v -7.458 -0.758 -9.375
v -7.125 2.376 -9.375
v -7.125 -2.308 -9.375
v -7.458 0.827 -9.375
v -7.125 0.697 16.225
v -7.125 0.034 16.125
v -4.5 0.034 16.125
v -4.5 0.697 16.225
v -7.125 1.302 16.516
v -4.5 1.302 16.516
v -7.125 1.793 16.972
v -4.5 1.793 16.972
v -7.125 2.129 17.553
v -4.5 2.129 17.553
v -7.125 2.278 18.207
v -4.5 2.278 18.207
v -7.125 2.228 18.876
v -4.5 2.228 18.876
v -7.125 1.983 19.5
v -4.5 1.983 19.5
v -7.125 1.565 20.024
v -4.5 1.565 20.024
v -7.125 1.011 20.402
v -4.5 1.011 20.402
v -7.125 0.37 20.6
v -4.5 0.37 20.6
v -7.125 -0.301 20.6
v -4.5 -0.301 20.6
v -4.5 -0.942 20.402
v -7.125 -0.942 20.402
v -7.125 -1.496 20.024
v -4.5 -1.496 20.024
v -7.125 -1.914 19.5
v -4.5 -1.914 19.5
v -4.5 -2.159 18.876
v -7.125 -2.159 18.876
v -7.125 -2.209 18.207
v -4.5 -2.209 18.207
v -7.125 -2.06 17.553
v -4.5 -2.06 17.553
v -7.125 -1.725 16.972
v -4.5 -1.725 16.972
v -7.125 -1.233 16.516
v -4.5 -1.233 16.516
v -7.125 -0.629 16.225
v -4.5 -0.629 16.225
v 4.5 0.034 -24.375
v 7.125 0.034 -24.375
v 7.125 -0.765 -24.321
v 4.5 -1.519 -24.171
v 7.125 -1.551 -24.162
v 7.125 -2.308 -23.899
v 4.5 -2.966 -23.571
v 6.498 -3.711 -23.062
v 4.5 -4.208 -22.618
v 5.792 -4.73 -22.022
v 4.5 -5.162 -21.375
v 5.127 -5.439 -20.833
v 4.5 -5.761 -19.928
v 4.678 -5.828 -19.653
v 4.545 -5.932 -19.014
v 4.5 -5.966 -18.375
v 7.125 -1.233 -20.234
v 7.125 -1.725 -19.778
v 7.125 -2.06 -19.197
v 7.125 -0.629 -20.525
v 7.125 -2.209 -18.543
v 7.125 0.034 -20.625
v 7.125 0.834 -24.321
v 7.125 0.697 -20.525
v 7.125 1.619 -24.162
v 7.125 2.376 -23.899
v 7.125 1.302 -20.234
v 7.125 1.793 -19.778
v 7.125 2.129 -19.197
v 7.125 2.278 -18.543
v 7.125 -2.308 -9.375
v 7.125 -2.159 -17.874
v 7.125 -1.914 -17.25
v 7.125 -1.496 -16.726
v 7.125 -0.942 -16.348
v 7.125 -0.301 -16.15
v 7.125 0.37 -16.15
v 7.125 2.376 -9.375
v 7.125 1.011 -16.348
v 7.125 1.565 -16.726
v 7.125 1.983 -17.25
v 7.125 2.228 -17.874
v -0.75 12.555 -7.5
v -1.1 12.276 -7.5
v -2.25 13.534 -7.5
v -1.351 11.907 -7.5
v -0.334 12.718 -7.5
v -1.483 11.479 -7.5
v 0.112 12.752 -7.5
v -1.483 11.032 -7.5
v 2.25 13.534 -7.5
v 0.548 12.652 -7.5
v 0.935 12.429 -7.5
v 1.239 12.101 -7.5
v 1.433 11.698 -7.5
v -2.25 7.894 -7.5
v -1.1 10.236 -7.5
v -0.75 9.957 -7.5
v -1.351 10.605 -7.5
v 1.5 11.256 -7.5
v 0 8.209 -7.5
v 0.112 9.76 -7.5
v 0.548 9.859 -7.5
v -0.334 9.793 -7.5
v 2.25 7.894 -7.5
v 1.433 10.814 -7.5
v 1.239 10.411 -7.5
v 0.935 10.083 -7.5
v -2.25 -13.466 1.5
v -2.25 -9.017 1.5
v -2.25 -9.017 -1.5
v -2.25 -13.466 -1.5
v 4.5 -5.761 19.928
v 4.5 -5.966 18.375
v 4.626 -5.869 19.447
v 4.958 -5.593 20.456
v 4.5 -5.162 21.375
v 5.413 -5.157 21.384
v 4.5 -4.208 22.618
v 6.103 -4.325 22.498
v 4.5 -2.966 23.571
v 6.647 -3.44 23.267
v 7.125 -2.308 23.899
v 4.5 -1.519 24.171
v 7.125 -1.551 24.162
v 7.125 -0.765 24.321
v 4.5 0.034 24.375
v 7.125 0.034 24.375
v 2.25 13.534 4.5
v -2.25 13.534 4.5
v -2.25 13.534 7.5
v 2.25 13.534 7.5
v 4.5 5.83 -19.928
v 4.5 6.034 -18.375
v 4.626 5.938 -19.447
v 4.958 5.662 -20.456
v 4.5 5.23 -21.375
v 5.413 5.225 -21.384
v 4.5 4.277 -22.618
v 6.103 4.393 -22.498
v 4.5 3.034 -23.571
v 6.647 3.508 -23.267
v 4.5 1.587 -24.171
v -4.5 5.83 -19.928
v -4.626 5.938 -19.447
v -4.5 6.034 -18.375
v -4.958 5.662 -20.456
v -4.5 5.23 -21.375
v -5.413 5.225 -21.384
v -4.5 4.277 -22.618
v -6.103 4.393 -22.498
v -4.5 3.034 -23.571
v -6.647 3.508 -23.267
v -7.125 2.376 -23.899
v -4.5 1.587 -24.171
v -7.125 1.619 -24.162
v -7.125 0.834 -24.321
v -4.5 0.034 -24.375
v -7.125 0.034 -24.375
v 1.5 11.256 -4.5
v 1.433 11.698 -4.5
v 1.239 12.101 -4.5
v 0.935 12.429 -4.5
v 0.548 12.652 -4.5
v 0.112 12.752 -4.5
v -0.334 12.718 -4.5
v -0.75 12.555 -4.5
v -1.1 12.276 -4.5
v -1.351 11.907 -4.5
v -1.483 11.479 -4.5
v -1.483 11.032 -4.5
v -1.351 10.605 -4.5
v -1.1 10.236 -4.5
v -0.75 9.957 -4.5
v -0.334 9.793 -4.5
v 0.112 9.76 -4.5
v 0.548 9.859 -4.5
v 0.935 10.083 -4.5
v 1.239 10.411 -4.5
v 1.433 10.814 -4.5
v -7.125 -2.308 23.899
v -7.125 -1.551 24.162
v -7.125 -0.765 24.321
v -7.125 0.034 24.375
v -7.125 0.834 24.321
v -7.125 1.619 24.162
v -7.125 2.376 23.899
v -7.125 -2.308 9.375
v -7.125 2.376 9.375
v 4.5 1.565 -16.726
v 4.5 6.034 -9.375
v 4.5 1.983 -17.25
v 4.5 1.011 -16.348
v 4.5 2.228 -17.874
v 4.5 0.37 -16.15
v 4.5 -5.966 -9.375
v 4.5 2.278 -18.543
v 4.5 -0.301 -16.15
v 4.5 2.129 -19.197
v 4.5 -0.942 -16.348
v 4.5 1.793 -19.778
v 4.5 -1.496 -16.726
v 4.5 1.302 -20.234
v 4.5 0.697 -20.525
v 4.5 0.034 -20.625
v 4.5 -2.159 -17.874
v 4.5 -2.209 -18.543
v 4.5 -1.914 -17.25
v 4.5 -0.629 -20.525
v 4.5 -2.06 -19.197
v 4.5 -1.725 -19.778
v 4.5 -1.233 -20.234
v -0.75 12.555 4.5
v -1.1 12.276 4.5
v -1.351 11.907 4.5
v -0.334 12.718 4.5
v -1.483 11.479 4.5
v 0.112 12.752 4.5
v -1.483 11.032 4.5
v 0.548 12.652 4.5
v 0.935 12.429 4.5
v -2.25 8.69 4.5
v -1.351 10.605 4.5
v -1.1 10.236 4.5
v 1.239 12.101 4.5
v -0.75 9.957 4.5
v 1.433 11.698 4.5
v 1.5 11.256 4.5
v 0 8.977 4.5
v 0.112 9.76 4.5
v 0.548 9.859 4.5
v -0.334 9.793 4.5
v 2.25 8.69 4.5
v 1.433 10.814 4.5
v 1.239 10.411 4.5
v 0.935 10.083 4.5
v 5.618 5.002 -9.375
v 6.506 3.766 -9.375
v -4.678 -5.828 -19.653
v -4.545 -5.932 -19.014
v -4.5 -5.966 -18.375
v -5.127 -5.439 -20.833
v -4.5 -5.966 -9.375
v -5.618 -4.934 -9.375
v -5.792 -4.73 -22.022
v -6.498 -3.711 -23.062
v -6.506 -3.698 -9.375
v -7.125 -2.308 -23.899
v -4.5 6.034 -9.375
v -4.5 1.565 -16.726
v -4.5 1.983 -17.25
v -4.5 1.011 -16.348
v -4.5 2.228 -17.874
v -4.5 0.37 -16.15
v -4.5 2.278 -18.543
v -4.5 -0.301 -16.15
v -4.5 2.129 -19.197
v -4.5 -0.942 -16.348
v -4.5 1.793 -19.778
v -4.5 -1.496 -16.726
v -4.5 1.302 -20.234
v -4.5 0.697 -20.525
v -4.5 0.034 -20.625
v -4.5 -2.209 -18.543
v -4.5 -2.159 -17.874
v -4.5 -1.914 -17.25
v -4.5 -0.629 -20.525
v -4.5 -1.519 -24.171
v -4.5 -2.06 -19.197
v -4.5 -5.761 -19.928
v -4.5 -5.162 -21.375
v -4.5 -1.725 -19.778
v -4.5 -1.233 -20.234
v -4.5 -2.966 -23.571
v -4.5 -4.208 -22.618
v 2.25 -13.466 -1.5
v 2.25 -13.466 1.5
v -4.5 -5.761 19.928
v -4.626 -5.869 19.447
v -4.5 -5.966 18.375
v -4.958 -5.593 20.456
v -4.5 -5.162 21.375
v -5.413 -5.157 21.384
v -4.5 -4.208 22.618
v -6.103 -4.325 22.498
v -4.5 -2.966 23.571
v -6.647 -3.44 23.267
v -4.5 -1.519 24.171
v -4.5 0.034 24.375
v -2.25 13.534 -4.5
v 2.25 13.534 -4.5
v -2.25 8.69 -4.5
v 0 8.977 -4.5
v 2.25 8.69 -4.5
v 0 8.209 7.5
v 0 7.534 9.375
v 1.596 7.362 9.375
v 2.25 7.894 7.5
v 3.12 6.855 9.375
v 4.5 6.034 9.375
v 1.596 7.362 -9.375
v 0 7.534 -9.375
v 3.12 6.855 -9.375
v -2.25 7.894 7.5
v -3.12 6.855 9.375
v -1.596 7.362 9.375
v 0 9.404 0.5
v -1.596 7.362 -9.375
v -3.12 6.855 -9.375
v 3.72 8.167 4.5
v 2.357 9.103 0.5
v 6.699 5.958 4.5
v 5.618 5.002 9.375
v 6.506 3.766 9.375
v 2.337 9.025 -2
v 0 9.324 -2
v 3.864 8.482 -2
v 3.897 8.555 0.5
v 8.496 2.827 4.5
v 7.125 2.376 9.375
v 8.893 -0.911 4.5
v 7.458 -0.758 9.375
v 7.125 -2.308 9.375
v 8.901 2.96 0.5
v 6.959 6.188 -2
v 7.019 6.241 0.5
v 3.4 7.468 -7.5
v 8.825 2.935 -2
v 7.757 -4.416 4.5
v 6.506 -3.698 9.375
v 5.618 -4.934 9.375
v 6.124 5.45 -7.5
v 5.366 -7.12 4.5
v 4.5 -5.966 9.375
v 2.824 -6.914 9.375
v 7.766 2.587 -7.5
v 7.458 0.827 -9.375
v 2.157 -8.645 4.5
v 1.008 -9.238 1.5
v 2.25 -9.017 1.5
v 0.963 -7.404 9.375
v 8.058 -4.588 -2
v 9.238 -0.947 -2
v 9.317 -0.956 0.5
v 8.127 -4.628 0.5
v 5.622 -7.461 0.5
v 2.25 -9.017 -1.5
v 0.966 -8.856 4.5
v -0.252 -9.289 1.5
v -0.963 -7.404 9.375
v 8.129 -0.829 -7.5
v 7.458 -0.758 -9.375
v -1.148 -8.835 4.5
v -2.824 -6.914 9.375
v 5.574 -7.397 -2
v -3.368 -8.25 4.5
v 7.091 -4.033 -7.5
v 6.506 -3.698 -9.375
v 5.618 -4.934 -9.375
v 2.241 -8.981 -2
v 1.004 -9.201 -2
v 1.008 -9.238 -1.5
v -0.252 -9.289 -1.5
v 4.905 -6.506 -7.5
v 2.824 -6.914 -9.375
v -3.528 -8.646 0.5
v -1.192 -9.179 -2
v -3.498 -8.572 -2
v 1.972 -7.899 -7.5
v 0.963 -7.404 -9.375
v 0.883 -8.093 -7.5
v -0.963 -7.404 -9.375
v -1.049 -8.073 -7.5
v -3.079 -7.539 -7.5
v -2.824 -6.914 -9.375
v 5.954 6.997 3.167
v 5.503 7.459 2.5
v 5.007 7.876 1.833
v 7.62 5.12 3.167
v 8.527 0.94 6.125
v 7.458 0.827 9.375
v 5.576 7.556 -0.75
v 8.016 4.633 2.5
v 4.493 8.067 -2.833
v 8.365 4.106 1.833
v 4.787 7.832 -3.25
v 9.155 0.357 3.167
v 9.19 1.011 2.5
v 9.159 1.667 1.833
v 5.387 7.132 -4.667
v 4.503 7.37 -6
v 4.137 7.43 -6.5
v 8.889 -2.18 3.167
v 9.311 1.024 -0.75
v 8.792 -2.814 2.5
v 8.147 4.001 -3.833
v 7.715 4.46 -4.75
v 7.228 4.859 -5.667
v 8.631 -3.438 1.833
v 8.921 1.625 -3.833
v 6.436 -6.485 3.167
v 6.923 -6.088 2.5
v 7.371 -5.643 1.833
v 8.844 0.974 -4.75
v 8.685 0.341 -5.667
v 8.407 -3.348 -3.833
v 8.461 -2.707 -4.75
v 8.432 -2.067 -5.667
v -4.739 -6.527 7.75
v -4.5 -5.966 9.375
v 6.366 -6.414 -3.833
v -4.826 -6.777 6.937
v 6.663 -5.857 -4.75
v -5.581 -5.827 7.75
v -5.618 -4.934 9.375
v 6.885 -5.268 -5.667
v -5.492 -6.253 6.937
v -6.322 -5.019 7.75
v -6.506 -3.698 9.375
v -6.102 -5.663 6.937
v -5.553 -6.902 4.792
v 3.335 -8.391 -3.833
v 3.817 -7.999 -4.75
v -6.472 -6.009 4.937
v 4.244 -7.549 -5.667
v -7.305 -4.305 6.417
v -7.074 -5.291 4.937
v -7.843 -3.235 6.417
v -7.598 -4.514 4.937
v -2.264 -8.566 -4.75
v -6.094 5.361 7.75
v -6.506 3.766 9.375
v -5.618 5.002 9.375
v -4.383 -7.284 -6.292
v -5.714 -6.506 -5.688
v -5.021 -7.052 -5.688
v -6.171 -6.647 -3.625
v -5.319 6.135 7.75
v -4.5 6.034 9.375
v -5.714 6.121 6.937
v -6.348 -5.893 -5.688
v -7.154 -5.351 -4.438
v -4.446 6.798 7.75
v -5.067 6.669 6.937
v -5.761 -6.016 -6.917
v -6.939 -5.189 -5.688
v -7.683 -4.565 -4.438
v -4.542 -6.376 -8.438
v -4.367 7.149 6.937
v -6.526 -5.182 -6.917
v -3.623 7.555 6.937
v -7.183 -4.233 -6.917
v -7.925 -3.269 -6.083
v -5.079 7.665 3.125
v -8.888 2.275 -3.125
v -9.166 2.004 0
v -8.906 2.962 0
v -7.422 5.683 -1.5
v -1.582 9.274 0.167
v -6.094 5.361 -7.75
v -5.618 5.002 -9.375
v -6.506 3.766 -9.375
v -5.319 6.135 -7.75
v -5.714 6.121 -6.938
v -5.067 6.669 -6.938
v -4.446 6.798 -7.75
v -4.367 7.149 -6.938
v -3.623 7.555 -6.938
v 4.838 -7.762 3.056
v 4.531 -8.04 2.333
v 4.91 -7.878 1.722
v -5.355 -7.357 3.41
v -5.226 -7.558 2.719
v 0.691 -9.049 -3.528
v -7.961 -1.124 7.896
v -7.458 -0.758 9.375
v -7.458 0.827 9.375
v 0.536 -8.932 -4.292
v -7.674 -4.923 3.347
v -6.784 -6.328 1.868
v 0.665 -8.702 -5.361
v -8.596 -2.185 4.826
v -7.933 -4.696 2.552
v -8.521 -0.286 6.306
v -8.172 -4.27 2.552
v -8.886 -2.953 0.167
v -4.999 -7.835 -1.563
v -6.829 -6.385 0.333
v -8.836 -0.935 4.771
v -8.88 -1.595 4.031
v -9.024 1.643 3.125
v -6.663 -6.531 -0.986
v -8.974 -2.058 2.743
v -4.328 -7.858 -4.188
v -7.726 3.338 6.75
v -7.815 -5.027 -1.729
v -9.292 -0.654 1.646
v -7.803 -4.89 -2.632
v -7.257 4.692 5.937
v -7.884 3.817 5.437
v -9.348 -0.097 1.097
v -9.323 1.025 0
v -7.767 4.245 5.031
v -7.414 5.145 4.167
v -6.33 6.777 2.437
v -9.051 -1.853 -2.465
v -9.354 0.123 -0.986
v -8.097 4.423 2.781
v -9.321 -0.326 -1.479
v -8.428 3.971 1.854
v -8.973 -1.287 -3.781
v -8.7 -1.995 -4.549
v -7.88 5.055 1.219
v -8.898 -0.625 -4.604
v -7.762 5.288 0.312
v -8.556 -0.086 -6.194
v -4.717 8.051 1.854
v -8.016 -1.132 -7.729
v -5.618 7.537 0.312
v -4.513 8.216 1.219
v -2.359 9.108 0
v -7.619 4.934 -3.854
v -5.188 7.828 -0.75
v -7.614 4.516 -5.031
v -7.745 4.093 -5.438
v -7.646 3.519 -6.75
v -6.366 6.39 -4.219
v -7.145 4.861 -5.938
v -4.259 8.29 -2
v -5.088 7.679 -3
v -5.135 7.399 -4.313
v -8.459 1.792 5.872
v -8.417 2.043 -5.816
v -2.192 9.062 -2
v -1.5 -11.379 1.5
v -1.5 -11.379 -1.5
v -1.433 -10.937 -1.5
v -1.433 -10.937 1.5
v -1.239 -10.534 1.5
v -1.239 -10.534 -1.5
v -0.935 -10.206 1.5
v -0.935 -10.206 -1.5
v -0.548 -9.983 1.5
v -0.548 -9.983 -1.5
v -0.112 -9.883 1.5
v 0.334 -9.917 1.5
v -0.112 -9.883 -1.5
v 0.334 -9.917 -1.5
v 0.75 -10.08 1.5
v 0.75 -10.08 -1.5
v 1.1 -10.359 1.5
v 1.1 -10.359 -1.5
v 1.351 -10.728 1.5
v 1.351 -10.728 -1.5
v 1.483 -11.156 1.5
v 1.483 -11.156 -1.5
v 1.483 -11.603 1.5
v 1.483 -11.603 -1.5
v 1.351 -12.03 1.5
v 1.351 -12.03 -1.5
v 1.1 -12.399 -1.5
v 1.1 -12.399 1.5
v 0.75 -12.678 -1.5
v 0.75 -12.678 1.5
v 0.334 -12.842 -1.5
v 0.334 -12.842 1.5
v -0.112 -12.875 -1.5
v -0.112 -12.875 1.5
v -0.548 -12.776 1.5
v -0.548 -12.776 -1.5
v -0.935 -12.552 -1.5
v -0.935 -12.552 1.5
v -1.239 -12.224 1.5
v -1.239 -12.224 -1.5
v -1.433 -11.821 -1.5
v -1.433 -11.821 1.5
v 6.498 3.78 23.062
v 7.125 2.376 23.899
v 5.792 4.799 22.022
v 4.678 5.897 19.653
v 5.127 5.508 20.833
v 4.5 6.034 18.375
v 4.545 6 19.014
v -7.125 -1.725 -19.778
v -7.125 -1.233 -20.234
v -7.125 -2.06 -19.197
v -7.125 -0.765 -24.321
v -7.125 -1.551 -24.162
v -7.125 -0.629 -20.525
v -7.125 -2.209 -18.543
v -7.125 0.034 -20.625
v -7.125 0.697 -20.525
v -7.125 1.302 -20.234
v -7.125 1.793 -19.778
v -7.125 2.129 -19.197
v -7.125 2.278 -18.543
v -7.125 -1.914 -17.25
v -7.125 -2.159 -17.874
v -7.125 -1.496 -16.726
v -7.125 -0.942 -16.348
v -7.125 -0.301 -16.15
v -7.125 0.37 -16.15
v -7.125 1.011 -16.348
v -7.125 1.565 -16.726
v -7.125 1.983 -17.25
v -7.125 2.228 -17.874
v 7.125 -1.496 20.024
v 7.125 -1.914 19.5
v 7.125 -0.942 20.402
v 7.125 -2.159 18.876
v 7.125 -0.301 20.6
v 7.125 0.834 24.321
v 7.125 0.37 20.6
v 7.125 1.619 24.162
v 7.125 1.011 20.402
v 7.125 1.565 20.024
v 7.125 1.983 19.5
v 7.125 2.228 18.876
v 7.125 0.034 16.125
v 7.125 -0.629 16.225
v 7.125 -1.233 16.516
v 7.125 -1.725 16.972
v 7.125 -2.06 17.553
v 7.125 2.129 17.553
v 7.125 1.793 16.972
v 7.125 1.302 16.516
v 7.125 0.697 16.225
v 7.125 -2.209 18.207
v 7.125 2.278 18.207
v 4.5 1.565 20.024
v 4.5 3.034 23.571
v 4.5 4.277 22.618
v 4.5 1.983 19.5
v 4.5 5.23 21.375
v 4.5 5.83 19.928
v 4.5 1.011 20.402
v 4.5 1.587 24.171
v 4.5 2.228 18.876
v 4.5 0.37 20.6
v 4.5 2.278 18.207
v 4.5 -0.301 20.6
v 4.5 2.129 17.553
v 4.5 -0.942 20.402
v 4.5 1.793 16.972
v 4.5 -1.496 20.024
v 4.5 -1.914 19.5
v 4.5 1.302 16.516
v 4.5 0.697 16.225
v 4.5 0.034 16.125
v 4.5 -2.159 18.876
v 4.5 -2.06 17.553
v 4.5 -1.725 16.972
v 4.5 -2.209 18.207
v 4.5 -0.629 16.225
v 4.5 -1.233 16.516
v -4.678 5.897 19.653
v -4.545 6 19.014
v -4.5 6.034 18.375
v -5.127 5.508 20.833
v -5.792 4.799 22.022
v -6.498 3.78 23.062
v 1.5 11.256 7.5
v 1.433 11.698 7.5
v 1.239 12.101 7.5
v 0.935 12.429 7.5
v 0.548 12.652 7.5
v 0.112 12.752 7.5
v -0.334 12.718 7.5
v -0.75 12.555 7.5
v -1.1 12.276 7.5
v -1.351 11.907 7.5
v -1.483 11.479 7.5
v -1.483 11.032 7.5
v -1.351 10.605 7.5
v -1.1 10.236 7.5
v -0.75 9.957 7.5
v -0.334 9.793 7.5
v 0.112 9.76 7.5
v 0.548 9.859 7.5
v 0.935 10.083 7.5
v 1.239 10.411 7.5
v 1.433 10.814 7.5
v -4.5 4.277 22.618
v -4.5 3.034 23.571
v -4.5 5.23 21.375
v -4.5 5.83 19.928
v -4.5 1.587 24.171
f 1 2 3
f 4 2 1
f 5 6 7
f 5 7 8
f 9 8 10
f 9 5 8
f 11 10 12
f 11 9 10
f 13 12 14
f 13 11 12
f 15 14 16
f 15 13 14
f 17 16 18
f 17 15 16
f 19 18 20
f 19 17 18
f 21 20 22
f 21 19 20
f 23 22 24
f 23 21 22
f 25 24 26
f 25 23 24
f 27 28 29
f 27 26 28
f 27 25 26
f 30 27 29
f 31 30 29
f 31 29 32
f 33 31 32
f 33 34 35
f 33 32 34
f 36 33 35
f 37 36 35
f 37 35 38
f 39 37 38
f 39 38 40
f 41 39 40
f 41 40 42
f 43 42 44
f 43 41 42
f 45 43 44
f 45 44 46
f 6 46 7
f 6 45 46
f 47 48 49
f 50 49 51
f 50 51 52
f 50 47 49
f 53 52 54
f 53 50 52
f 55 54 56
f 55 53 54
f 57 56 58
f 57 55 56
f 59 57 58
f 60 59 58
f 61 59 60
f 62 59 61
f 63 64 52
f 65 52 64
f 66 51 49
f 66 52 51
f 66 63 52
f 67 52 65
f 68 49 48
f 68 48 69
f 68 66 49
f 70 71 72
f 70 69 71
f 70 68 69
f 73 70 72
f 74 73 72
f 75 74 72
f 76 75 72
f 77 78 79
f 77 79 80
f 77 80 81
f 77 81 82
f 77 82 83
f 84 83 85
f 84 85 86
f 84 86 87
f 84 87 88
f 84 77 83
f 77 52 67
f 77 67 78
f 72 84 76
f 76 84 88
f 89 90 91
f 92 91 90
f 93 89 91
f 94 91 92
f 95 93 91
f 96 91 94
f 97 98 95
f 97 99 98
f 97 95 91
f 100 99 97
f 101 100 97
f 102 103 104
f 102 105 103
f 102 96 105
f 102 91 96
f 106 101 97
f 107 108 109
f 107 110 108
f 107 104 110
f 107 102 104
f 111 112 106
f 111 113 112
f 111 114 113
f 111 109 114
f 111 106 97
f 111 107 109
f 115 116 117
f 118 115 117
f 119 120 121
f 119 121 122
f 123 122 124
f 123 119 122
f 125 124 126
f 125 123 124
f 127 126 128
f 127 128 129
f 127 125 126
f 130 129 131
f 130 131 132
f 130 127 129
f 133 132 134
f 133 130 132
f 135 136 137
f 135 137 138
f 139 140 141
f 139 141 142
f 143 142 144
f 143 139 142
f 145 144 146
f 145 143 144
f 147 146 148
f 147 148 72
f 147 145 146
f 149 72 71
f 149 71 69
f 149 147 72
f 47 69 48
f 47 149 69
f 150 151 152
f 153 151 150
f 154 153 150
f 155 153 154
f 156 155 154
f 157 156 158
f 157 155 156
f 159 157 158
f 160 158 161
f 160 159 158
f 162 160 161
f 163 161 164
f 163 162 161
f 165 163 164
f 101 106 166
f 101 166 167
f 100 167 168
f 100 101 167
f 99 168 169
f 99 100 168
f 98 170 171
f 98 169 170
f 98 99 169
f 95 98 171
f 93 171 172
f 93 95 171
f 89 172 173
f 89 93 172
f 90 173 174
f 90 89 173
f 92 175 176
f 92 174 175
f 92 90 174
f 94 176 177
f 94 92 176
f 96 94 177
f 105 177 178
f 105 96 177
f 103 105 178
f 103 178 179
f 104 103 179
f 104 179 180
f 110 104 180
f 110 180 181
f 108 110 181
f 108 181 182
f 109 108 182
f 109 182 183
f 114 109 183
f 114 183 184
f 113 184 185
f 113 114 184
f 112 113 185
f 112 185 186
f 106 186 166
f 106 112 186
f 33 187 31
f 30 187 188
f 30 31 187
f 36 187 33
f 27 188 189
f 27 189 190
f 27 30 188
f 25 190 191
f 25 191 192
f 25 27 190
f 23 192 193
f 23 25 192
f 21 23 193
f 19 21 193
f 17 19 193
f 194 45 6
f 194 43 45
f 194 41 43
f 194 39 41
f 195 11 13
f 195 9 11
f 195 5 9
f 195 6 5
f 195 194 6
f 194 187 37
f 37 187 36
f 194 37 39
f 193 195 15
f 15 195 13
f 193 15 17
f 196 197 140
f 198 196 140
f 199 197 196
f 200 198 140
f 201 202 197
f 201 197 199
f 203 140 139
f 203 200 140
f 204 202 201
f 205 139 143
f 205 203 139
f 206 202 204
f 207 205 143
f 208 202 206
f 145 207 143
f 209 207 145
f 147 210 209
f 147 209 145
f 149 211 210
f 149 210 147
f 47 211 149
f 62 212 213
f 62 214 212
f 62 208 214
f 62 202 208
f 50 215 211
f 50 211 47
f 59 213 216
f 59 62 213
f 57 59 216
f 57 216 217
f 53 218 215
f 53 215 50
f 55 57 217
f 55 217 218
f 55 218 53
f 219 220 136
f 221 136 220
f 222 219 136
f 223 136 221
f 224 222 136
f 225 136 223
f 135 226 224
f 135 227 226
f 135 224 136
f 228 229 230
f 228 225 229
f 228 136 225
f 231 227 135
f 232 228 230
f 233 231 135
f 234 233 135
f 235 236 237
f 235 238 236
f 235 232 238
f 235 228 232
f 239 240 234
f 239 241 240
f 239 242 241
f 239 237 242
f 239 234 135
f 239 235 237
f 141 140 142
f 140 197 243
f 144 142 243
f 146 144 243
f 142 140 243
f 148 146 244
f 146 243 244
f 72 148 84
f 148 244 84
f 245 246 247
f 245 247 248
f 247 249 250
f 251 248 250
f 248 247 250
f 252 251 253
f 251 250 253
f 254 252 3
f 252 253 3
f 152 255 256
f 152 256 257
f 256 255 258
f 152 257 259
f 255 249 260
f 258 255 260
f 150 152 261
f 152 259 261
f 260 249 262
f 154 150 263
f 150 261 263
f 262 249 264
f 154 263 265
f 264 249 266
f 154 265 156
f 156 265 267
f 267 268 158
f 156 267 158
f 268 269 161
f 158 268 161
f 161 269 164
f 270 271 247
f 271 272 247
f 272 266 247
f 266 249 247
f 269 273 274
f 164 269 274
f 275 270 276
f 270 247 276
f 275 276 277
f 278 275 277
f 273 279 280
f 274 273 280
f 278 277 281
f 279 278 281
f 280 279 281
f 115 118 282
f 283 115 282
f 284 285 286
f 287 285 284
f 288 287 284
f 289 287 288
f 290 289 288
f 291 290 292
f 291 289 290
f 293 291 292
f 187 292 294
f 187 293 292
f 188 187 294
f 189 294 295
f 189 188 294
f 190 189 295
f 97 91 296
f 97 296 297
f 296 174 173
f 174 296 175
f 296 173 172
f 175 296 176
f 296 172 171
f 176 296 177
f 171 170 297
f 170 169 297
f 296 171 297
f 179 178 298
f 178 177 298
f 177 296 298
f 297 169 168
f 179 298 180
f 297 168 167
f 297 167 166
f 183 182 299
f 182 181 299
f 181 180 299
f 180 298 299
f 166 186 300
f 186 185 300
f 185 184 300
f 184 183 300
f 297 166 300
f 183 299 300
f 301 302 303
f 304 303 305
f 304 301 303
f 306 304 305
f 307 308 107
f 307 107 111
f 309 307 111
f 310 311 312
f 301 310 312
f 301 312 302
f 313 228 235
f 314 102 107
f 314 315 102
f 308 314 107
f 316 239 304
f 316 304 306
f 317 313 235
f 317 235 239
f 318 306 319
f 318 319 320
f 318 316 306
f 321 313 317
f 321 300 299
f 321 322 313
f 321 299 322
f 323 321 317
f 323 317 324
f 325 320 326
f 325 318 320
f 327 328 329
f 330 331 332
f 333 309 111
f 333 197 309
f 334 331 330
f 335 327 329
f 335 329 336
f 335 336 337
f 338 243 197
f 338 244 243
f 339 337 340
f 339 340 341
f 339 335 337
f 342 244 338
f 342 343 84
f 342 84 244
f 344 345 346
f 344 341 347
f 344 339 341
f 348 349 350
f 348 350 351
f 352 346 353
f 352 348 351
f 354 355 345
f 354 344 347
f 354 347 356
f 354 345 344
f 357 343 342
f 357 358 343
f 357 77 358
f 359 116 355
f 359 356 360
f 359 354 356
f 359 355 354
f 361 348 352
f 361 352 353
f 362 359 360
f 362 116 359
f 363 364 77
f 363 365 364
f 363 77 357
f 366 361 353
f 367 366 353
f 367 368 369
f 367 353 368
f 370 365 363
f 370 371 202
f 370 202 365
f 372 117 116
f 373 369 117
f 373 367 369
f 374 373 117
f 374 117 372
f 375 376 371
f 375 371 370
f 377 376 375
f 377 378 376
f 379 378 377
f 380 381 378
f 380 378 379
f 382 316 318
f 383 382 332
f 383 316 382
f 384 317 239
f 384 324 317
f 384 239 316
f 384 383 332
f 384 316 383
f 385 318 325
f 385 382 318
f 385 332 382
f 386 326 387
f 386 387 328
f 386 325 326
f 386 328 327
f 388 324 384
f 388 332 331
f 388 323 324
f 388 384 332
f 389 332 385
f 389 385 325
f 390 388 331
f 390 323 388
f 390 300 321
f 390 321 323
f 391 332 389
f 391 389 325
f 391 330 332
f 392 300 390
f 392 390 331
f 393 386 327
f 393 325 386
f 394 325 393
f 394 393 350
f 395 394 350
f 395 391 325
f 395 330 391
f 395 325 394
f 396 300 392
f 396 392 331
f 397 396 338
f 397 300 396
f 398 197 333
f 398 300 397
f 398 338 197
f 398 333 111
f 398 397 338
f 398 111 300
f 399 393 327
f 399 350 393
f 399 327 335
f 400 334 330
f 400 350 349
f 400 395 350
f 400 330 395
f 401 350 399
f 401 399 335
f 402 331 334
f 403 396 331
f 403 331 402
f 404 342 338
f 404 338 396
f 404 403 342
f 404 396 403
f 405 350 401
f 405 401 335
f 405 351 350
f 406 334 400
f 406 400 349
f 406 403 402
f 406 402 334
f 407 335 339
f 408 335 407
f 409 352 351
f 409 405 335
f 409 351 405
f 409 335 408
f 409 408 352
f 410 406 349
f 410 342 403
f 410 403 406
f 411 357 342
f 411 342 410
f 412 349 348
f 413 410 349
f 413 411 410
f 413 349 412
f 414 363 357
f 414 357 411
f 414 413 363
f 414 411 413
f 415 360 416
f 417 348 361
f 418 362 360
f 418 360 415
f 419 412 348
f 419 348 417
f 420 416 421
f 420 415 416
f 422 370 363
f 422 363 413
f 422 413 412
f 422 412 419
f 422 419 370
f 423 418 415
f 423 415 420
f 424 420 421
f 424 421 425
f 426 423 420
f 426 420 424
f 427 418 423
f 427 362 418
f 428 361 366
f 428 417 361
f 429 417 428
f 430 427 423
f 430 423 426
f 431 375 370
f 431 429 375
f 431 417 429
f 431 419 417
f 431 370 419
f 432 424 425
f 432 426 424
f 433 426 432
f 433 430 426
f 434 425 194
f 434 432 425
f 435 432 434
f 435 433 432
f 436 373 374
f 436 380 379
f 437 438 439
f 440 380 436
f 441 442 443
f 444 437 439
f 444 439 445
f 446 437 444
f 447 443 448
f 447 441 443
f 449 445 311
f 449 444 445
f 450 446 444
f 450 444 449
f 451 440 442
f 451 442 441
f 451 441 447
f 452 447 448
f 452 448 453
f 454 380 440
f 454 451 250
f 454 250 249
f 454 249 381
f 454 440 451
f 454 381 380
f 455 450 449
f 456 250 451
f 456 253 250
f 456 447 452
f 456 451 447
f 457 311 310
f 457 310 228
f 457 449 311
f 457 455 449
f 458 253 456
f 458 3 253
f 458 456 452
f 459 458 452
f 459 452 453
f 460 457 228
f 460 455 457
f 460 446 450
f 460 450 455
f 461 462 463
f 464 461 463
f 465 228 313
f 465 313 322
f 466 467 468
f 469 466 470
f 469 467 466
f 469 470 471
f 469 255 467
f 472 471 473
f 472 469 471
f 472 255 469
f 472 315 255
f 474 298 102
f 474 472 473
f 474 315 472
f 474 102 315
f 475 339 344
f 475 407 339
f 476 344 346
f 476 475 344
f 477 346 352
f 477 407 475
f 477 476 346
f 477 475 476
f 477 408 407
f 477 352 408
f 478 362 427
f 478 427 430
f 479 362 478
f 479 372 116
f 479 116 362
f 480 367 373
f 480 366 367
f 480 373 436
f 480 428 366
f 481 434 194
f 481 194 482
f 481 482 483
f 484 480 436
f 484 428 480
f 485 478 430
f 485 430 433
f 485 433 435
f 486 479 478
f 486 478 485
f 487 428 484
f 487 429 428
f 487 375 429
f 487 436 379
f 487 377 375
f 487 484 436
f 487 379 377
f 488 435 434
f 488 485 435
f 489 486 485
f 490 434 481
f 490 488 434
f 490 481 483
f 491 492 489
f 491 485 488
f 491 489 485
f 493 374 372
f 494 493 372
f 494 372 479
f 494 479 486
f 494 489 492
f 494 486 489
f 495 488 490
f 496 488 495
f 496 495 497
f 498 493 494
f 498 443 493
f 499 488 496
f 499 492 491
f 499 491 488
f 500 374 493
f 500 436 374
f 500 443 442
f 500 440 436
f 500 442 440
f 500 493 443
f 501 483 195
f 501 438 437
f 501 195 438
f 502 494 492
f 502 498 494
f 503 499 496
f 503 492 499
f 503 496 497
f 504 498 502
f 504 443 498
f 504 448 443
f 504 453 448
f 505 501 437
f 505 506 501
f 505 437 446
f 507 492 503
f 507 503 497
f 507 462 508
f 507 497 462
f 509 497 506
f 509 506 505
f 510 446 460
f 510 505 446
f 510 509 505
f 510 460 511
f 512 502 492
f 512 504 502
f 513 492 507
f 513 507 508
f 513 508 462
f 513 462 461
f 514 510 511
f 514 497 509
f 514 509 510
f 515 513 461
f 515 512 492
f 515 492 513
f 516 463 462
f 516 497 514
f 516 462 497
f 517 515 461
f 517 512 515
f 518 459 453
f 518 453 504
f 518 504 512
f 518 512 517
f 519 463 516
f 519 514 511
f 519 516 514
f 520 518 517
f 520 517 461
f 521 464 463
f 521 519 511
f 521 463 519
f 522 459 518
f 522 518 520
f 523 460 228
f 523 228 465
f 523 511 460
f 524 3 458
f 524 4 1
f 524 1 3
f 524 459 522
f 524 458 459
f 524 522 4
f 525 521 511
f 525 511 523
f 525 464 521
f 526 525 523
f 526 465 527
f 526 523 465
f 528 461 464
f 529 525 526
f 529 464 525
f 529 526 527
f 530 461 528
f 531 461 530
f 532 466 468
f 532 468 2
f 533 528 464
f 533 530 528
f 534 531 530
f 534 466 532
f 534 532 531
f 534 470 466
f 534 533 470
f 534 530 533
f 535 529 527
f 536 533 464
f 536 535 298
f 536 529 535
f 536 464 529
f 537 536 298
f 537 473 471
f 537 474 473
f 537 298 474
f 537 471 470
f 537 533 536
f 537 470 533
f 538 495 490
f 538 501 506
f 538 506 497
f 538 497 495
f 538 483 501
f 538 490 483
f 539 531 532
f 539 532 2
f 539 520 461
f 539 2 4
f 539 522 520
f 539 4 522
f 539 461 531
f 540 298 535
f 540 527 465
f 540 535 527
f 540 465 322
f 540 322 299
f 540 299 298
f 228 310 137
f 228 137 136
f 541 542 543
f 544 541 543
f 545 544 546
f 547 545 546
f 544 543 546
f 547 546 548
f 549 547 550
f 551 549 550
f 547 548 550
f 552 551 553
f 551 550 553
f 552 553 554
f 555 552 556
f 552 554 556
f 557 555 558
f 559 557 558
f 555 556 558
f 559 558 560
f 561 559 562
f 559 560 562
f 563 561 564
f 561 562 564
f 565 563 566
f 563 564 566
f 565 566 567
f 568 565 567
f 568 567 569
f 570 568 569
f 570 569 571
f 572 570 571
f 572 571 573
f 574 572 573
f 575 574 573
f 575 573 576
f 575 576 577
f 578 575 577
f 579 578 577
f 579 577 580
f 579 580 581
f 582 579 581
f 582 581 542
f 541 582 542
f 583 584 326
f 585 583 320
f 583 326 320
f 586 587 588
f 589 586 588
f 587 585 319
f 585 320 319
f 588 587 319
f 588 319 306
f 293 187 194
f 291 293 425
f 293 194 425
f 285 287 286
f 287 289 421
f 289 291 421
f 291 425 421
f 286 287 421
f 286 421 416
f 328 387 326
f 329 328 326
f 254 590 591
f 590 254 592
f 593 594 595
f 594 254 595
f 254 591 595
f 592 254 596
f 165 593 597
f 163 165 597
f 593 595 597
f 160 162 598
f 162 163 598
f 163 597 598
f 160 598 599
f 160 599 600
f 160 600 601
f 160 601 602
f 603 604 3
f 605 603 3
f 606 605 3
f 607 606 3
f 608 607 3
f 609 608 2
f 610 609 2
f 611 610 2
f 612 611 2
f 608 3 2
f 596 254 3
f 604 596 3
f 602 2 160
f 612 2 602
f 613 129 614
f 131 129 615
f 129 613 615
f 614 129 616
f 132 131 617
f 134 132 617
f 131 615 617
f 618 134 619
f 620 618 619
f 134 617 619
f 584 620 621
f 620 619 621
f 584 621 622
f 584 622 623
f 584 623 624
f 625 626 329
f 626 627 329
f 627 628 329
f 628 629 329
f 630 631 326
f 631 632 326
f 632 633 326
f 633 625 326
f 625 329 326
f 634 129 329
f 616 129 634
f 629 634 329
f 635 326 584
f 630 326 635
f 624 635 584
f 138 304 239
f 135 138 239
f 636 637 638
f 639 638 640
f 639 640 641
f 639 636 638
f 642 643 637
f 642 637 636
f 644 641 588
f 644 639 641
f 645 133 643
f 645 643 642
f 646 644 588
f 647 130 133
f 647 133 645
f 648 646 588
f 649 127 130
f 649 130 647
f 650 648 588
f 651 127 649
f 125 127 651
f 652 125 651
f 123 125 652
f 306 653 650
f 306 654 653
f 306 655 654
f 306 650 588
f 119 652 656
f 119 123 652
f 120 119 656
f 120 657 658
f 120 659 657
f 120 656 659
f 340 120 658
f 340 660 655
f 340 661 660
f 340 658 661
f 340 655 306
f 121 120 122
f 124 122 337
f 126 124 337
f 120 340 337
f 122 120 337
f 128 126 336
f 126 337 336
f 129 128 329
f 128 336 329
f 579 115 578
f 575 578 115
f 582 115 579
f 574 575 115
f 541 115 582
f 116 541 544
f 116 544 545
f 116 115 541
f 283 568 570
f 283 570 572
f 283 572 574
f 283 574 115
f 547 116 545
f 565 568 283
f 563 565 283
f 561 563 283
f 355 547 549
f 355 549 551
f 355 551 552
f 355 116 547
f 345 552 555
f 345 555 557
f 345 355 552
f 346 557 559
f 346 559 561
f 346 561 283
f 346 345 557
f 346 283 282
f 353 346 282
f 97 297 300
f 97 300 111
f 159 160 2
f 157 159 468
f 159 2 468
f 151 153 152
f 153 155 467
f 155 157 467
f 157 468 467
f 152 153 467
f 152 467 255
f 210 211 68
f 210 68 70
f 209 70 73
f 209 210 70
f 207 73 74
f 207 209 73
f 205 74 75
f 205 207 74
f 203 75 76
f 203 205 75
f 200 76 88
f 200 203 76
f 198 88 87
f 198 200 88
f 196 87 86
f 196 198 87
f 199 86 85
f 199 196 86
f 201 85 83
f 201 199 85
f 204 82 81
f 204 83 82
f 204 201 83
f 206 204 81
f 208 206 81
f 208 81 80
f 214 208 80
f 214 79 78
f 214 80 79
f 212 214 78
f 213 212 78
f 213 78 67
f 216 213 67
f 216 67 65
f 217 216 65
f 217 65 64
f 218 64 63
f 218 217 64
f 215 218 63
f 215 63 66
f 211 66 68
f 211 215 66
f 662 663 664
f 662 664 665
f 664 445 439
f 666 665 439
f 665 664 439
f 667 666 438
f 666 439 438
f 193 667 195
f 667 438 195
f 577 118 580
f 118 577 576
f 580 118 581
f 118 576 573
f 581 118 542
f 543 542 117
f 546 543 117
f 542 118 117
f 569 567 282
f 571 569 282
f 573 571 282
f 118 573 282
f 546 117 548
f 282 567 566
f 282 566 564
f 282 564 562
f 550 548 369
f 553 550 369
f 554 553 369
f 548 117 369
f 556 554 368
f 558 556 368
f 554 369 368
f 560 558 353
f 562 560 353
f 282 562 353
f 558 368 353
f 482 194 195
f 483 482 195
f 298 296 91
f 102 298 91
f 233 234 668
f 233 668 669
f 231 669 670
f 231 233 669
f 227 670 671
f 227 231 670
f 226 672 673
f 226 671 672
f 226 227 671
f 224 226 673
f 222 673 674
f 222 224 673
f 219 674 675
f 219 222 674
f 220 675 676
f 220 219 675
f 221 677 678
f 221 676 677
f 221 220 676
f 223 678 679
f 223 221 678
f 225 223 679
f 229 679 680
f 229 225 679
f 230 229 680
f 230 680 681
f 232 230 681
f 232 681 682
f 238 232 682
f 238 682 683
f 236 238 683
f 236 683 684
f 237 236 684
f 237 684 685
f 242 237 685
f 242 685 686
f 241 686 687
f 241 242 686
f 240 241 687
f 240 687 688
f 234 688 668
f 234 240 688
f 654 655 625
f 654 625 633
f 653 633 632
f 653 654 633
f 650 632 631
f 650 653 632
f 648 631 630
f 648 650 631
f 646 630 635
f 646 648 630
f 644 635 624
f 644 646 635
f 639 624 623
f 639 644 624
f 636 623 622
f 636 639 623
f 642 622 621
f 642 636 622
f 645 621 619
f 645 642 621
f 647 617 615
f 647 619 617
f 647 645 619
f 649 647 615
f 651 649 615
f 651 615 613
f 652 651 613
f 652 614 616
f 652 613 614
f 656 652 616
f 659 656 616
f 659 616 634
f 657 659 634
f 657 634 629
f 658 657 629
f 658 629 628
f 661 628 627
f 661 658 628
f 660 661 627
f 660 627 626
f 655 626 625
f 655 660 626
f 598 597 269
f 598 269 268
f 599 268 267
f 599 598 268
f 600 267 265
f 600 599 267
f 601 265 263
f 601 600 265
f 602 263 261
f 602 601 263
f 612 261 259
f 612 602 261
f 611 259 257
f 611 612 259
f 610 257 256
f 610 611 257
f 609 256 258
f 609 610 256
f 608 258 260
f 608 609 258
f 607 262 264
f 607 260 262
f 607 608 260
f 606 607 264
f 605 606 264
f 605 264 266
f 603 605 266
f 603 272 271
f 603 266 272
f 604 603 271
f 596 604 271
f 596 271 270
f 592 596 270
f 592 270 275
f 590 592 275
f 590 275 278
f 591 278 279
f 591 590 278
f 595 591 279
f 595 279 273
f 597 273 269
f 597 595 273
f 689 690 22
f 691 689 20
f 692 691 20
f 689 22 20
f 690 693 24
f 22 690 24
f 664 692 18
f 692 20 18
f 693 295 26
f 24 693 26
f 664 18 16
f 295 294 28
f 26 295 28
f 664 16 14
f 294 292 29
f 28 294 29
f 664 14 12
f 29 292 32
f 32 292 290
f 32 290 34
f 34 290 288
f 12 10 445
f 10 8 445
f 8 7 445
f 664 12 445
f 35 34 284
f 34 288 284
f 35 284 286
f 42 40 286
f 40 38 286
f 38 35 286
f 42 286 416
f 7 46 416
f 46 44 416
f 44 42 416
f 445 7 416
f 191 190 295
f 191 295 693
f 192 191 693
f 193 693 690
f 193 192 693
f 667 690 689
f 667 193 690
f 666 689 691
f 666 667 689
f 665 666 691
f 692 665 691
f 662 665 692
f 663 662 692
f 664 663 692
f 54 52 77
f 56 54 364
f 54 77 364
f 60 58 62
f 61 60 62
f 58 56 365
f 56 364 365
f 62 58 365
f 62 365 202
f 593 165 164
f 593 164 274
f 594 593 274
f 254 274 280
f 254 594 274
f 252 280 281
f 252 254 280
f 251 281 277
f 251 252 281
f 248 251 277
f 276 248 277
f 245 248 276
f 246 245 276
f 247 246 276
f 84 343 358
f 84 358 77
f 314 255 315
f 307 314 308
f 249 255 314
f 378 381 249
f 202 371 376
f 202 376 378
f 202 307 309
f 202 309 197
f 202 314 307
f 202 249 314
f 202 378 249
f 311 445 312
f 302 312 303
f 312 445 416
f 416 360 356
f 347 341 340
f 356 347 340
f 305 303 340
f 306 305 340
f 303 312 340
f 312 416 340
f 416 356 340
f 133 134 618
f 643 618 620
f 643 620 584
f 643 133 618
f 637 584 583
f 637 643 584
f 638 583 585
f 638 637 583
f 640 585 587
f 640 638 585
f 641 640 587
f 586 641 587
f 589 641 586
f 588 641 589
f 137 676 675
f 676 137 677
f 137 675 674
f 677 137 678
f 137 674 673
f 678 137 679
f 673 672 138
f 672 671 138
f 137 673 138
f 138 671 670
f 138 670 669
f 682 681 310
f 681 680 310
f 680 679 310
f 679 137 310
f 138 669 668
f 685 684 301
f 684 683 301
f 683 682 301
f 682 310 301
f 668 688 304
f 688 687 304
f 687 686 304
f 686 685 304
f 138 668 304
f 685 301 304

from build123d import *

# Parameters (mm, degrees)
SKETCH3_W                = 19
SKETCH3_H                = 20
BOSS_EXTRUDE2_DEPTH      = 20
SKETCH4_W                = 19
SKETCH4_H                = 20
BOSS_EXTRUDE3_DEPTH      = 20
SKETCH5_R                = 15
SKETCH5_R_2              = 10
CUT_EXTRUDE1_DEPTH       = 49.347699066
SKETCH6_R                = 15
SKETCH6_R_2              = 10
CUT_EXTRUDE2_DEPTH       = 49.347699066
CUT_EXTRUDE3_DEPTH       = 37.996621535
CUT_EXTRUDE3_DEPTH_BACK  = 37.996621535
SKETCH7_W                = 12
SKETCH7_H                = 20
CUT_EXTRUDE4_DEPTH       = 40.430318363
CUT_EXTRUDE4_DEPTH_BACK  = 40.430318363
CUT_EXTRUDE5_DEPTH       = 40.430318445
CUT_EXTRUDE5_DEPTH_BACK  = 40.430318445
CUT_EXTRUDE8_DEPTH       = 42.188590816
CUT_EXTRUDE8_DEPTH_BACK  = 42.188590816
SKETCH10_R               = 3
SKETCH11_W               = 6
SKETCH11_H               = 4
BOSS_EXTRUDE5_DEPTH      = 18
SKETCH12_R               = 2
CUT_EXTRUDE9_DEPTH       = 41.871750794
SKETCH13_W               = 6
SKETCH13_H               = 4
BOSS_EXTRUDE6_DEPTH      = 18
CUT_EXTRUDE10_DEPTH      = 45.300113022
CUT_EXTRUDE10_DEPTH_BACK = 45.300113022
SKETCH14_R               = 2
SCALE1_SCALE             = 0.75


with BuildPart() as part:
    # Sketch2 → Revolve1 (revolve)
    with BuildSketch(Plane(origin=(0, 0, 0), x_dir=(0, 0, -1), z_dir=(1, 0, 0))):
        with BuildLine():
            Line((-12.5, 0), (12.5, 0))
            Line((12.5, 0), (12.5, 10))
            add(Edge.make_bspline(
                [(-12.5, 10), (0, 15), (12.5, 10)],
                knots=[0, 0, 0, 1, 1, 1], degree=2))
            Line((-12.5, 10), (-12.5, 0))
        make_face()
    revolve(axis=Axis((0, 0, 12.5), (0, 0, -1)))

    # Sketch3 → Boss-Extrude2 (add)
    with BuildSketch(Plane.XY.offset(12.5)):
        Rectangle(SKETCH3_W, SKETCH3_H)
    extrude(amount=BOSS_EXTRUDE2_DEPTH)

    # Sketch4 → Boss-Extrude3 (add)
    with BuildSketch(Plane(origin=(0, 0, -12.5), x_dir=(-1, 0, 0), z_dir=(0, 0, -1))):
        Rectangle(SKETCH4_W, SKETCH4_H)
    extrude(amount=BOSS_EXTRUDE3_DEPTH)

    # Sketch5 → Cut-Extrude1 (cut, through all)
    with BuildSketch(Plane(origin=(0, 0, -12.5), x_dir=(-1, 0, 0), z_dir=(0, 0, -1))):
        Circle(SKETCH5_R)
        Circle(SKETCH5_R_2, mode=Mode.SUBTRACT)
    extrude(amount=CUT_EXTRUDE1_DEPTH, mode=Mode.SUBTRACT)

    # Sketch6 → Cut-Extrude2 (cut, through all)
    with BuildSketch(Plane.XY.offset(12.5)):
        Circle(SKETCH6_R)
        Circle(SKETCH6_R_2, mode=Mode.SUBTRACT)
    extrude(amount=CUT_EXTRUDE2_DEPTH, mode=Mode.SUBTRACT)

    # Sketch7 → Cut-Extrude3 (cut, two sides: drawn at the far end of the back side and taken through both)
    with BuildSketch(Plane(origin=(0, 0, 0), x_dir=(1, 0, 0), z_dir=(0, 1, 0)).offset(-CUT_EXTRUDE3_DEPTH_BACK)):
        with Locations((0, 22.5)):
            Rectangle(SKETCH7_W, SKETCH7_H)
        with Locations((0, -22.5)):
            Rectangle(SKETCH7_W, SKETCH7_H)
    extrude(amount=CUT_EXTRUDE3_DEPTH + CUT_EXTRUDE3_DEPTH_BACK, mode=Mode.SUBTRACT)

    # Sketch8 → Cut-Extrude4 (cut, two sides: drawn at the far end of the back side and taken through both)
    with BuildSketch(Plane(origin=(-6, 0, 0), x_dir=(0, 0, -1), z_dir=(1, 0, 0)).offset(-CUT_EXTRUDE4_DEPTH_BACK)):
        with BuildLine():
            Line((-32.5, 8), (-32.5, -5.1e-08))
            ThreePointArc((-32.5, -5.1e-08), (-30.156854267, 5.656854232), (-24.5, 8))
            Line((-24.5, 8), (-32.5, 8))
        make_face()
        with BuildLine():
            Line((-32.5, -8), (-24.5, -8))
            ThreePointArc((-24.5, -8), (-30.156854232, -5.656854267), (-32.5, -5.1e-08))
            Line((-32.5, -5.1e-08), (-32.5, -8))
        make_face()
    extrude(amount=CUT_EXTRUDE4_DEPTH + CUT_EXTRUDE4_DEPTH_BACK, mode=Mode.SUBTRACT)

    # Sketch9 → Cut-Extrude5 (cut, two sides: drawn at the far end of the back side and taken through both)
    with BuildSketch(Plane(origin=(-6, 0, 0), x_dir=(0, 0, -1), z_dir=(1, 0, 0)).offset(-CUT_EXTRUDE5_DEPTH_BACK)):
        with BuildLine():
            ThreePointArc((24.5, 8), (30.156854249, 5.656854249), (32.5, 0))
            Line((32.5, 0), (32.5, 8))
            Line((32.5, 8), (24.5, 8))
        make_face()
        with BuildLine():
            ThreePointArc((32.5, 0), (30.156854249, -5.656854249), (24.5, -8))
            Line((24.5, -8), (32.5, -8))
            Line((32.5, -8), (32.5, 0))
        make_face()
    extrude(amount=CUT_EXTRUDE5_DEPTH + CUT_EXTRUDE5_DEPTH_BACK, mode=Mode.SUBTRACT)

    # Sketch10 → Cut-Extrude8 (cut, two sides: drawn at the far end of the back side and taken through both)
    with BuildSketch(Plane(origin=(9.5, 0, 0), x_dir=(0, 0, -1), z_dir=(1, 0, 0)).offset(-CUT_EXTRUDE8_DEPTH_BACK)):
        with Locations((24.5, 0)):
            Circle(SKETCH10_R)
        with Locations((-24.5, 0)):
            Circle(SKETCH10_R)
    extrude(amount=CUT_EXTRUDE8_DEPTH + CUT_EXTRUDE8_DEPTH_BACK, mode=Mode.SUBTRACT)

    # Sketch11 → Boss-Extrude5 (add)
    with BuildSketch(Plane(origin=(0, 0, 0), x_dir=(1, 0, 0), z_dir=(0, 1, 0))):
        Rectangle(SKETCH11_W, SKETCH11_H)
    extrude(amount=-BOSS_EXTRUDE5_DEPTH)

    # Sketch12 → Cut-Extrude9 (cut, through all)
    with BuildSketch(Plane(origin=(0, 0, -2), x_dir=(-1, 0, 0), z_dir=(0, 0, -1))):
        with Locations((0, -15.218)):
            Circle(SKETCH12_R)
    extrude(amount=-CUT_EXTRUDE9_DEPTH, mode=Mode.SUBTRACT)

    # Sketch13 → Boss-Extrude6 (add)
    with BuildSketch(Plane(origin=(0, 0, 0), x_dir=(1, 0, 0), z_dir=(0, 1, 0))):
        with Locations((0, 8)):
            Rectangle(SKETCH13_W, SKETCH13_H)
        with Locations((0, -8)):
            Rectangle(SKETCH13_W, SKETCH13_H)
    extrude(amount=BOSS_EXTRUDE6_DEPTH)

    # Sketch14 → Cut-Extrude10 (cut, two sides: drawn at the far end of the back side and taken through both)
    with BuildSketch(Plane.XY.offset(-6).offset(-CUT_EXTRUDE10_DEPTH_BACK)):
        with Locations((0, 14.962)):
            Circle(SKETCH14_R)
    extrude(amount=CUT_EXTRUDE10_DEPTH + CUT_EXTRUDE10_DEPTH_BACK, mode=Mode.SUBTRACT)


with BuildPart() as part_1:
    # Scale1: scaled about (2.6e-08, 0.137076755, -6.1e-08)
    add(part.part.scale(SCALE1_SCALE).moved(Location((7e-09, 0.034269189, -1.5e-08))))


solid = part_1.part
